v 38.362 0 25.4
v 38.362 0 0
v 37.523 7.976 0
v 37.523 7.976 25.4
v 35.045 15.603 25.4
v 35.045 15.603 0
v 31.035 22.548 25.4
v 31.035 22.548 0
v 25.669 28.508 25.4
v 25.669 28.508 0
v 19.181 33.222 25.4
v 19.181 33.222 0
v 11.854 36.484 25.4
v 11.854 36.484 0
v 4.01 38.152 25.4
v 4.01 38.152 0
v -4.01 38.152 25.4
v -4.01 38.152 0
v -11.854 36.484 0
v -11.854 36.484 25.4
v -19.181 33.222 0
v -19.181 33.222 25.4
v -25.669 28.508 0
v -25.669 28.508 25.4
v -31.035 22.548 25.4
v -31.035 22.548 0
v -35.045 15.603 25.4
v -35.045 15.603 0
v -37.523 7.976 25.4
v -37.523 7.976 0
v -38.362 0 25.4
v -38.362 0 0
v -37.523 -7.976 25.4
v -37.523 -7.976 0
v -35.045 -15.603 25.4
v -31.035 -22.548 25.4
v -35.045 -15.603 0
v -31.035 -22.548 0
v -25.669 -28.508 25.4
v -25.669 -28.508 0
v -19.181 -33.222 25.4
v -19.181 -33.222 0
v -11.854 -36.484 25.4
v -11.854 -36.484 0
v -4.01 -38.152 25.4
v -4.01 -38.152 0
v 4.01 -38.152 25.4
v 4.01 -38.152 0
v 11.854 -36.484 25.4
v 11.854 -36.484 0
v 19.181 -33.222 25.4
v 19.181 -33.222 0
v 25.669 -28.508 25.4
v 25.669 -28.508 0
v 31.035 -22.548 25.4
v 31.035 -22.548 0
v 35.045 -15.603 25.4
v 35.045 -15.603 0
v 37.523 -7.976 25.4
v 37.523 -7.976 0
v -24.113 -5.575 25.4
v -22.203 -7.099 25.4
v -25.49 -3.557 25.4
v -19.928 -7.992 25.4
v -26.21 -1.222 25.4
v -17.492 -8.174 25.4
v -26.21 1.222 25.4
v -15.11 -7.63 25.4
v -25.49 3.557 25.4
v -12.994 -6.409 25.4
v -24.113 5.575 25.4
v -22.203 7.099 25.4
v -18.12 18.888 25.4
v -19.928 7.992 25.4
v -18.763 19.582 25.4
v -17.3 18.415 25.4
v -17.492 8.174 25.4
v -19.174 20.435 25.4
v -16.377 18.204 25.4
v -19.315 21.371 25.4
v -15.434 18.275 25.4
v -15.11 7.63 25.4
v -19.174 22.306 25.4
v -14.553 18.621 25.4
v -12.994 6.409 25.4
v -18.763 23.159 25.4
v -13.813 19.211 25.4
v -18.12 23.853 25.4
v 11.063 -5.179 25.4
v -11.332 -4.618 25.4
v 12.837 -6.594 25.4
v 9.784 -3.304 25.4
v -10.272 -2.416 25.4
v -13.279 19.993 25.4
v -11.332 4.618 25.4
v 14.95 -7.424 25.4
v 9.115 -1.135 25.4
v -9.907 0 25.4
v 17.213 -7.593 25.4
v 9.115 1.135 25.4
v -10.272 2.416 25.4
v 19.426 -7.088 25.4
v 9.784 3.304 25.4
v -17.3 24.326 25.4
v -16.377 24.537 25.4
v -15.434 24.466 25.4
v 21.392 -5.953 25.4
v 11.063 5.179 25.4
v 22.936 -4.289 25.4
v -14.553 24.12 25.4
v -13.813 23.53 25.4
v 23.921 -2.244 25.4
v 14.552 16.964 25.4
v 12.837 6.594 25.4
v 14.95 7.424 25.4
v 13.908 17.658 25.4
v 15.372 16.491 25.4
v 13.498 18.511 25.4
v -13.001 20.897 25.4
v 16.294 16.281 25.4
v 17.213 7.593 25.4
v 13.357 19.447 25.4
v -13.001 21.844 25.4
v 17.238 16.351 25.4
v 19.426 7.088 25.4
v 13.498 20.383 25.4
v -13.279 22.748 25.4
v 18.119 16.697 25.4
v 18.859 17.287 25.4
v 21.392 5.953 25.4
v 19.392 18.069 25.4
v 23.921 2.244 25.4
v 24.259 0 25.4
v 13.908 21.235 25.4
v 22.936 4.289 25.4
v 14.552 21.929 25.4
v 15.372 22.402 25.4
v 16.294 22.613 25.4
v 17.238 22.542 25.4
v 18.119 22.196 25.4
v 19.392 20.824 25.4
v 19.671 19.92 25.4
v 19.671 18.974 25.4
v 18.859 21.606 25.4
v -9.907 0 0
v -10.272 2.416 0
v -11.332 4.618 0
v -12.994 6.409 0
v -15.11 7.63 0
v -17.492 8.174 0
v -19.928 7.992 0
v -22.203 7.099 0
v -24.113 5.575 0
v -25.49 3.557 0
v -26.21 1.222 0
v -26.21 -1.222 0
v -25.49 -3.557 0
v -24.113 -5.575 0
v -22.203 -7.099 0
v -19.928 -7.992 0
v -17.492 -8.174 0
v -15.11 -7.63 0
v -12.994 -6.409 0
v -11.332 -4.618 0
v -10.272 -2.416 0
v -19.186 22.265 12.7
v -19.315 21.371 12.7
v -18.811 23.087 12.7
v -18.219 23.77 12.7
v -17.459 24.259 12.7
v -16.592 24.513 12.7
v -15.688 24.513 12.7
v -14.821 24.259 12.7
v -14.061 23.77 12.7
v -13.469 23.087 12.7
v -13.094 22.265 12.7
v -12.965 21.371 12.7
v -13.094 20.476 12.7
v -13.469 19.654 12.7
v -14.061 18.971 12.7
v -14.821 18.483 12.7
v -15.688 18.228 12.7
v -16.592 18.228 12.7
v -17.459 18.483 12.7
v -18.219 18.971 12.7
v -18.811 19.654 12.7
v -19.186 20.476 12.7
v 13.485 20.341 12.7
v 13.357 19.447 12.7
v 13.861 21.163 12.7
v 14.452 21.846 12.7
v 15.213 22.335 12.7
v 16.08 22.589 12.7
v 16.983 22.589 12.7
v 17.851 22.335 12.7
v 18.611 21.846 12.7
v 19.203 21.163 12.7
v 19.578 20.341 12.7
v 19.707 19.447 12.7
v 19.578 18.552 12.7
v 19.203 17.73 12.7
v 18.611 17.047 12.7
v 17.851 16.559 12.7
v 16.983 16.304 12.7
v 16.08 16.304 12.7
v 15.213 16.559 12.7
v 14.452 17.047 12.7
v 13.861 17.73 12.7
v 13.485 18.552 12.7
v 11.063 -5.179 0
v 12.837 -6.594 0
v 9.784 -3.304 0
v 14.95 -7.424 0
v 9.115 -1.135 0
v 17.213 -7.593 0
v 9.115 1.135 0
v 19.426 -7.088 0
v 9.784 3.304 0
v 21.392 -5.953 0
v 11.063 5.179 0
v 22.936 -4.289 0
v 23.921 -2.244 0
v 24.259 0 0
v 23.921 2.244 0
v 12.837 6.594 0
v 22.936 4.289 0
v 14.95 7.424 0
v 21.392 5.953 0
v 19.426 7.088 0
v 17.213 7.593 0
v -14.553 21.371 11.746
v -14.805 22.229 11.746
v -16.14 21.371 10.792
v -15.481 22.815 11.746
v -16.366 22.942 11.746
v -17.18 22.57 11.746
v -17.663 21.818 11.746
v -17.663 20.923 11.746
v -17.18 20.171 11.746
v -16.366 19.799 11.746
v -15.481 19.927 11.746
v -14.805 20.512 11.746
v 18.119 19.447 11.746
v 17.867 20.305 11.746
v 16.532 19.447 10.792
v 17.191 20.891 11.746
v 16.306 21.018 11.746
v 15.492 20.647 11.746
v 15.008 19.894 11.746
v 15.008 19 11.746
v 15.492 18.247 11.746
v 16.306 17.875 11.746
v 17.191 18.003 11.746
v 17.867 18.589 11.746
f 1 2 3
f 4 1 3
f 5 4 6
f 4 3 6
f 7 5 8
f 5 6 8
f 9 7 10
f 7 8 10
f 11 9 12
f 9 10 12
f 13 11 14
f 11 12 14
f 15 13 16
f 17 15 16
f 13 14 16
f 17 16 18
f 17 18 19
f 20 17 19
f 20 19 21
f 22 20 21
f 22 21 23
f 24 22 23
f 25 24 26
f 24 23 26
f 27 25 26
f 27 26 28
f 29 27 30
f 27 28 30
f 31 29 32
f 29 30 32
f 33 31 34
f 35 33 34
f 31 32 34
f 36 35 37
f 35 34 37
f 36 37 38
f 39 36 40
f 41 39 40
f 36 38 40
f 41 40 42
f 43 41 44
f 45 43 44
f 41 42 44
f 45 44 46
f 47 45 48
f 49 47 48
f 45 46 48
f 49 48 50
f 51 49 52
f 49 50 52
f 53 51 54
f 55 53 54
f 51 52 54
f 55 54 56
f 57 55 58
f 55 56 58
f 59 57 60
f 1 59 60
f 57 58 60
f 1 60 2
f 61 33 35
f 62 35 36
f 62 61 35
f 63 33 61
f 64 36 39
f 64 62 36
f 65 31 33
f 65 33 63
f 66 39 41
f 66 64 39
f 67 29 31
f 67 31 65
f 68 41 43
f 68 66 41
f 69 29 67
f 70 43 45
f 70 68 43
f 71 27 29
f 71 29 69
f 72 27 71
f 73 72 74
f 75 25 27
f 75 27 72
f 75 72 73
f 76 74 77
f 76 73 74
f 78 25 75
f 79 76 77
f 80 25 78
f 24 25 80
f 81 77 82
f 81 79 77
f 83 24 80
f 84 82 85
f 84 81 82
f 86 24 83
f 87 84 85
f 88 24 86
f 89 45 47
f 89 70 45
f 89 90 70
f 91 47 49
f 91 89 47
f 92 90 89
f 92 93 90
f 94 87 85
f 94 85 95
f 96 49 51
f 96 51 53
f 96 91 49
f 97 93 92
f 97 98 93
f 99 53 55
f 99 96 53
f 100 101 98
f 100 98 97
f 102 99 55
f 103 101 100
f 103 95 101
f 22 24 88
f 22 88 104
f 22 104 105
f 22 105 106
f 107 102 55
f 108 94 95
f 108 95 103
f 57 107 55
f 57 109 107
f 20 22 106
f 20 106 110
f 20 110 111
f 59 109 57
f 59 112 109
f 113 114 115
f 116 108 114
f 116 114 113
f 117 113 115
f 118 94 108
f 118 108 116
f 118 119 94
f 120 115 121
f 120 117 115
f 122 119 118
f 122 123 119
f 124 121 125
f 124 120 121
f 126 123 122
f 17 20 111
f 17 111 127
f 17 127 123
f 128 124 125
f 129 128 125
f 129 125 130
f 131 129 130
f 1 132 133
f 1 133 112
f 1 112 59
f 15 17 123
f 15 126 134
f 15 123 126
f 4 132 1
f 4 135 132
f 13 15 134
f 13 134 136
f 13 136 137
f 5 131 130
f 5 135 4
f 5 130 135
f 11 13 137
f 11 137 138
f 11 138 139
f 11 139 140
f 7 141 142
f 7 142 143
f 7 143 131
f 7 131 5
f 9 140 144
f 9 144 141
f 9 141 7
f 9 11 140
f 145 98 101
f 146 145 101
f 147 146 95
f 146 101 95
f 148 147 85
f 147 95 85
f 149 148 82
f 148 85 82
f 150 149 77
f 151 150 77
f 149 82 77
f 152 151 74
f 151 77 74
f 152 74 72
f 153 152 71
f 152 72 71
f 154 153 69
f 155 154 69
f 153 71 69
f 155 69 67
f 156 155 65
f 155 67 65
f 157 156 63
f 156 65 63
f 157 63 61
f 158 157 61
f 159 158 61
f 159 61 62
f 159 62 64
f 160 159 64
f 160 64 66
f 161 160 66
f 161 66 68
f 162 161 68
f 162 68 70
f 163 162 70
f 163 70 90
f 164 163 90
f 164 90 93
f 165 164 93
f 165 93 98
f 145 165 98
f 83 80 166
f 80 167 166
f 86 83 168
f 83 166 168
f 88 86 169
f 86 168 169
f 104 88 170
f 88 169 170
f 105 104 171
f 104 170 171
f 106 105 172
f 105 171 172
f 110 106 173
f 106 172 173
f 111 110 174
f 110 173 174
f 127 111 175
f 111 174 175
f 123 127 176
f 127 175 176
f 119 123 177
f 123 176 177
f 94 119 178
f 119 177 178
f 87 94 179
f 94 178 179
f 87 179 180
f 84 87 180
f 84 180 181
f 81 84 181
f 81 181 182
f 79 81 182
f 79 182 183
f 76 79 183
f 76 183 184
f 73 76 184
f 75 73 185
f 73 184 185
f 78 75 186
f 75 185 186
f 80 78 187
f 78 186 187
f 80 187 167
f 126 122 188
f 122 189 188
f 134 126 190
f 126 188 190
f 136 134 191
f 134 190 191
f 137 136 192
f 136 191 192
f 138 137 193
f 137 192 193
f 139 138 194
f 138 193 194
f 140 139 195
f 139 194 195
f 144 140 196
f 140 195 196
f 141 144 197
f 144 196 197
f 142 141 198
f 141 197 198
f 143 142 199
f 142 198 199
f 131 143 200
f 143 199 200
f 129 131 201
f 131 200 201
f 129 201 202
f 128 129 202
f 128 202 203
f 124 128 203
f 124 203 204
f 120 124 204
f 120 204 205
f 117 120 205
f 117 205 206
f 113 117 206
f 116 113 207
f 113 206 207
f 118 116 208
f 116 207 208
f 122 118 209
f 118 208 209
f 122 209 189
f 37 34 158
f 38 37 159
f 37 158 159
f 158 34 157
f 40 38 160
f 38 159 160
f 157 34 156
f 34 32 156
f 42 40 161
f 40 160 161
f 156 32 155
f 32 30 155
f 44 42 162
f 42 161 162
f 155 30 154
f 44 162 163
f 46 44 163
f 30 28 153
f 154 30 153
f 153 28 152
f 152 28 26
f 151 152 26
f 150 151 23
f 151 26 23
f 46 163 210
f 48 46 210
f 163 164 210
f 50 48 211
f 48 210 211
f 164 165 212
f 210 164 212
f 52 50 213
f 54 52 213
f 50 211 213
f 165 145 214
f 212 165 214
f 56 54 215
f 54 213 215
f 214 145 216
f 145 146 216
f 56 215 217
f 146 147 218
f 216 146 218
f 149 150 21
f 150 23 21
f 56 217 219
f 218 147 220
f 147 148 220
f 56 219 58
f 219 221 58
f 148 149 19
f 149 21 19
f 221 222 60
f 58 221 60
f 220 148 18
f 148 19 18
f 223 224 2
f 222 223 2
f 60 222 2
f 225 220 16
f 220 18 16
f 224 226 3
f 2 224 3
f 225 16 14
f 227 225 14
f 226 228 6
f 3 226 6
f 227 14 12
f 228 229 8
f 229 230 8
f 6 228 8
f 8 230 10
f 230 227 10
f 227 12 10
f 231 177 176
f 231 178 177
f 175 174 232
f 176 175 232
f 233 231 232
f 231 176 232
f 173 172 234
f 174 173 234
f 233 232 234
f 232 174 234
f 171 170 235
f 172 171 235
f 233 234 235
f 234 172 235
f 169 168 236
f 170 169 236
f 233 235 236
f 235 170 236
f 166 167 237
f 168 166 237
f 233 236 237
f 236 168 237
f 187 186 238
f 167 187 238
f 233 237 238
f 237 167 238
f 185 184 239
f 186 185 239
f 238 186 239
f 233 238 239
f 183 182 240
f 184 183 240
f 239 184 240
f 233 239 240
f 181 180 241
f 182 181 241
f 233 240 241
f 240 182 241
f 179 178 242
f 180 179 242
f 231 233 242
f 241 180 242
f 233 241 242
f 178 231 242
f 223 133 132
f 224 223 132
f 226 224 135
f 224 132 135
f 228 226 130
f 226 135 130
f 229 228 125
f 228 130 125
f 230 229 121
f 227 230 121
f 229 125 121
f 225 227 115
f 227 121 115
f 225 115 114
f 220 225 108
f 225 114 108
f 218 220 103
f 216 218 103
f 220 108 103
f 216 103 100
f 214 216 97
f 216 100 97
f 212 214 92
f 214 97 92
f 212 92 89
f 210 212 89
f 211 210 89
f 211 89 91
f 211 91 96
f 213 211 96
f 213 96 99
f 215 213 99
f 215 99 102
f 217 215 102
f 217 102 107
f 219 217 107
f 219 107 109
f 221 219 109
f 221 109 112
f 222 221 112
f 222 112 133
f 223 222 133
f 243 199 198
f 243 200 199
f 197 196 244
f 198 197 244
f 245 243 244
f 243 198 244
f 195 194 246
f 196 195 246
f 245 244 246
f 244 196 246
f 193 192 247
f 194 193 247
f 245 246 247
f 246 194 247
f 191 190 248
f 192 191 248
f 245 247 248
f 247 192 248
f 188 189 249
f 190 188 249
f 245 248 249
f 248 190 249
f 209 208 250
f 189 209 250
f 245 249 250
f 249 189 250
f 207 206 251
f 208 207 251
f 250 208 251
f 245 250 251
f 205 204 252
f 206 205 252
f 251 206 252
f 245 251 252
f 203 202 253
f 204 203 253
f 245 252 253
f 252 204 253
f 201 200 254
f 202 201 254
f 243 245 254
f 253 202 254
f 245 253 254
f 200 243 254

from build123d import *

# Parameters (mm, degrees)
F0_R     = 38.3617531957
F1_DEPTH = 25.4
F2_R     = 7.6146171672
F2_R_2   = 8.1970349446
F3_DEPTH = 25.401
F5_D     = 6.35
F5_DEPTH = 12.7
F5_TIP   = 1.9077324654


with BuildPart() as f1:
    # F0 (on Top) → F1 (new body)
    with BuildSketch(Plane.XY):
        Circle(F0_R)
    extrude(amount=F1_DEPTH)

    # F2 (on face) → F3 (cut, through all)
    with BuildSketch(Plane.XY.offset(25.4)):
        with Locations((16.6444163769, 0)):
            Circle(F2_R)
        with Locations((-18.1044526398, 0)):
            Circle(F2_R_2)
    extrude(amount=-F3_DEPTH, mode=Mode.SUBTRACT)

    # F5
    with Locations(Plane.XY.offset(25.4)):
        with Locations((-16.1400576362, 21.3705980134), (16.5315663715, 19.4467739825)):
            Hole(F5_D / 2, depth=F5_DEPTH)
            with Locations((0, 0, -(F5_DEPTH + F5_TIP / 2))):  # 118° drill point
                Cone(0, F5_D / 2, F5_TIP, mode=Mode.SUBTRACT)


solid = f1.part
